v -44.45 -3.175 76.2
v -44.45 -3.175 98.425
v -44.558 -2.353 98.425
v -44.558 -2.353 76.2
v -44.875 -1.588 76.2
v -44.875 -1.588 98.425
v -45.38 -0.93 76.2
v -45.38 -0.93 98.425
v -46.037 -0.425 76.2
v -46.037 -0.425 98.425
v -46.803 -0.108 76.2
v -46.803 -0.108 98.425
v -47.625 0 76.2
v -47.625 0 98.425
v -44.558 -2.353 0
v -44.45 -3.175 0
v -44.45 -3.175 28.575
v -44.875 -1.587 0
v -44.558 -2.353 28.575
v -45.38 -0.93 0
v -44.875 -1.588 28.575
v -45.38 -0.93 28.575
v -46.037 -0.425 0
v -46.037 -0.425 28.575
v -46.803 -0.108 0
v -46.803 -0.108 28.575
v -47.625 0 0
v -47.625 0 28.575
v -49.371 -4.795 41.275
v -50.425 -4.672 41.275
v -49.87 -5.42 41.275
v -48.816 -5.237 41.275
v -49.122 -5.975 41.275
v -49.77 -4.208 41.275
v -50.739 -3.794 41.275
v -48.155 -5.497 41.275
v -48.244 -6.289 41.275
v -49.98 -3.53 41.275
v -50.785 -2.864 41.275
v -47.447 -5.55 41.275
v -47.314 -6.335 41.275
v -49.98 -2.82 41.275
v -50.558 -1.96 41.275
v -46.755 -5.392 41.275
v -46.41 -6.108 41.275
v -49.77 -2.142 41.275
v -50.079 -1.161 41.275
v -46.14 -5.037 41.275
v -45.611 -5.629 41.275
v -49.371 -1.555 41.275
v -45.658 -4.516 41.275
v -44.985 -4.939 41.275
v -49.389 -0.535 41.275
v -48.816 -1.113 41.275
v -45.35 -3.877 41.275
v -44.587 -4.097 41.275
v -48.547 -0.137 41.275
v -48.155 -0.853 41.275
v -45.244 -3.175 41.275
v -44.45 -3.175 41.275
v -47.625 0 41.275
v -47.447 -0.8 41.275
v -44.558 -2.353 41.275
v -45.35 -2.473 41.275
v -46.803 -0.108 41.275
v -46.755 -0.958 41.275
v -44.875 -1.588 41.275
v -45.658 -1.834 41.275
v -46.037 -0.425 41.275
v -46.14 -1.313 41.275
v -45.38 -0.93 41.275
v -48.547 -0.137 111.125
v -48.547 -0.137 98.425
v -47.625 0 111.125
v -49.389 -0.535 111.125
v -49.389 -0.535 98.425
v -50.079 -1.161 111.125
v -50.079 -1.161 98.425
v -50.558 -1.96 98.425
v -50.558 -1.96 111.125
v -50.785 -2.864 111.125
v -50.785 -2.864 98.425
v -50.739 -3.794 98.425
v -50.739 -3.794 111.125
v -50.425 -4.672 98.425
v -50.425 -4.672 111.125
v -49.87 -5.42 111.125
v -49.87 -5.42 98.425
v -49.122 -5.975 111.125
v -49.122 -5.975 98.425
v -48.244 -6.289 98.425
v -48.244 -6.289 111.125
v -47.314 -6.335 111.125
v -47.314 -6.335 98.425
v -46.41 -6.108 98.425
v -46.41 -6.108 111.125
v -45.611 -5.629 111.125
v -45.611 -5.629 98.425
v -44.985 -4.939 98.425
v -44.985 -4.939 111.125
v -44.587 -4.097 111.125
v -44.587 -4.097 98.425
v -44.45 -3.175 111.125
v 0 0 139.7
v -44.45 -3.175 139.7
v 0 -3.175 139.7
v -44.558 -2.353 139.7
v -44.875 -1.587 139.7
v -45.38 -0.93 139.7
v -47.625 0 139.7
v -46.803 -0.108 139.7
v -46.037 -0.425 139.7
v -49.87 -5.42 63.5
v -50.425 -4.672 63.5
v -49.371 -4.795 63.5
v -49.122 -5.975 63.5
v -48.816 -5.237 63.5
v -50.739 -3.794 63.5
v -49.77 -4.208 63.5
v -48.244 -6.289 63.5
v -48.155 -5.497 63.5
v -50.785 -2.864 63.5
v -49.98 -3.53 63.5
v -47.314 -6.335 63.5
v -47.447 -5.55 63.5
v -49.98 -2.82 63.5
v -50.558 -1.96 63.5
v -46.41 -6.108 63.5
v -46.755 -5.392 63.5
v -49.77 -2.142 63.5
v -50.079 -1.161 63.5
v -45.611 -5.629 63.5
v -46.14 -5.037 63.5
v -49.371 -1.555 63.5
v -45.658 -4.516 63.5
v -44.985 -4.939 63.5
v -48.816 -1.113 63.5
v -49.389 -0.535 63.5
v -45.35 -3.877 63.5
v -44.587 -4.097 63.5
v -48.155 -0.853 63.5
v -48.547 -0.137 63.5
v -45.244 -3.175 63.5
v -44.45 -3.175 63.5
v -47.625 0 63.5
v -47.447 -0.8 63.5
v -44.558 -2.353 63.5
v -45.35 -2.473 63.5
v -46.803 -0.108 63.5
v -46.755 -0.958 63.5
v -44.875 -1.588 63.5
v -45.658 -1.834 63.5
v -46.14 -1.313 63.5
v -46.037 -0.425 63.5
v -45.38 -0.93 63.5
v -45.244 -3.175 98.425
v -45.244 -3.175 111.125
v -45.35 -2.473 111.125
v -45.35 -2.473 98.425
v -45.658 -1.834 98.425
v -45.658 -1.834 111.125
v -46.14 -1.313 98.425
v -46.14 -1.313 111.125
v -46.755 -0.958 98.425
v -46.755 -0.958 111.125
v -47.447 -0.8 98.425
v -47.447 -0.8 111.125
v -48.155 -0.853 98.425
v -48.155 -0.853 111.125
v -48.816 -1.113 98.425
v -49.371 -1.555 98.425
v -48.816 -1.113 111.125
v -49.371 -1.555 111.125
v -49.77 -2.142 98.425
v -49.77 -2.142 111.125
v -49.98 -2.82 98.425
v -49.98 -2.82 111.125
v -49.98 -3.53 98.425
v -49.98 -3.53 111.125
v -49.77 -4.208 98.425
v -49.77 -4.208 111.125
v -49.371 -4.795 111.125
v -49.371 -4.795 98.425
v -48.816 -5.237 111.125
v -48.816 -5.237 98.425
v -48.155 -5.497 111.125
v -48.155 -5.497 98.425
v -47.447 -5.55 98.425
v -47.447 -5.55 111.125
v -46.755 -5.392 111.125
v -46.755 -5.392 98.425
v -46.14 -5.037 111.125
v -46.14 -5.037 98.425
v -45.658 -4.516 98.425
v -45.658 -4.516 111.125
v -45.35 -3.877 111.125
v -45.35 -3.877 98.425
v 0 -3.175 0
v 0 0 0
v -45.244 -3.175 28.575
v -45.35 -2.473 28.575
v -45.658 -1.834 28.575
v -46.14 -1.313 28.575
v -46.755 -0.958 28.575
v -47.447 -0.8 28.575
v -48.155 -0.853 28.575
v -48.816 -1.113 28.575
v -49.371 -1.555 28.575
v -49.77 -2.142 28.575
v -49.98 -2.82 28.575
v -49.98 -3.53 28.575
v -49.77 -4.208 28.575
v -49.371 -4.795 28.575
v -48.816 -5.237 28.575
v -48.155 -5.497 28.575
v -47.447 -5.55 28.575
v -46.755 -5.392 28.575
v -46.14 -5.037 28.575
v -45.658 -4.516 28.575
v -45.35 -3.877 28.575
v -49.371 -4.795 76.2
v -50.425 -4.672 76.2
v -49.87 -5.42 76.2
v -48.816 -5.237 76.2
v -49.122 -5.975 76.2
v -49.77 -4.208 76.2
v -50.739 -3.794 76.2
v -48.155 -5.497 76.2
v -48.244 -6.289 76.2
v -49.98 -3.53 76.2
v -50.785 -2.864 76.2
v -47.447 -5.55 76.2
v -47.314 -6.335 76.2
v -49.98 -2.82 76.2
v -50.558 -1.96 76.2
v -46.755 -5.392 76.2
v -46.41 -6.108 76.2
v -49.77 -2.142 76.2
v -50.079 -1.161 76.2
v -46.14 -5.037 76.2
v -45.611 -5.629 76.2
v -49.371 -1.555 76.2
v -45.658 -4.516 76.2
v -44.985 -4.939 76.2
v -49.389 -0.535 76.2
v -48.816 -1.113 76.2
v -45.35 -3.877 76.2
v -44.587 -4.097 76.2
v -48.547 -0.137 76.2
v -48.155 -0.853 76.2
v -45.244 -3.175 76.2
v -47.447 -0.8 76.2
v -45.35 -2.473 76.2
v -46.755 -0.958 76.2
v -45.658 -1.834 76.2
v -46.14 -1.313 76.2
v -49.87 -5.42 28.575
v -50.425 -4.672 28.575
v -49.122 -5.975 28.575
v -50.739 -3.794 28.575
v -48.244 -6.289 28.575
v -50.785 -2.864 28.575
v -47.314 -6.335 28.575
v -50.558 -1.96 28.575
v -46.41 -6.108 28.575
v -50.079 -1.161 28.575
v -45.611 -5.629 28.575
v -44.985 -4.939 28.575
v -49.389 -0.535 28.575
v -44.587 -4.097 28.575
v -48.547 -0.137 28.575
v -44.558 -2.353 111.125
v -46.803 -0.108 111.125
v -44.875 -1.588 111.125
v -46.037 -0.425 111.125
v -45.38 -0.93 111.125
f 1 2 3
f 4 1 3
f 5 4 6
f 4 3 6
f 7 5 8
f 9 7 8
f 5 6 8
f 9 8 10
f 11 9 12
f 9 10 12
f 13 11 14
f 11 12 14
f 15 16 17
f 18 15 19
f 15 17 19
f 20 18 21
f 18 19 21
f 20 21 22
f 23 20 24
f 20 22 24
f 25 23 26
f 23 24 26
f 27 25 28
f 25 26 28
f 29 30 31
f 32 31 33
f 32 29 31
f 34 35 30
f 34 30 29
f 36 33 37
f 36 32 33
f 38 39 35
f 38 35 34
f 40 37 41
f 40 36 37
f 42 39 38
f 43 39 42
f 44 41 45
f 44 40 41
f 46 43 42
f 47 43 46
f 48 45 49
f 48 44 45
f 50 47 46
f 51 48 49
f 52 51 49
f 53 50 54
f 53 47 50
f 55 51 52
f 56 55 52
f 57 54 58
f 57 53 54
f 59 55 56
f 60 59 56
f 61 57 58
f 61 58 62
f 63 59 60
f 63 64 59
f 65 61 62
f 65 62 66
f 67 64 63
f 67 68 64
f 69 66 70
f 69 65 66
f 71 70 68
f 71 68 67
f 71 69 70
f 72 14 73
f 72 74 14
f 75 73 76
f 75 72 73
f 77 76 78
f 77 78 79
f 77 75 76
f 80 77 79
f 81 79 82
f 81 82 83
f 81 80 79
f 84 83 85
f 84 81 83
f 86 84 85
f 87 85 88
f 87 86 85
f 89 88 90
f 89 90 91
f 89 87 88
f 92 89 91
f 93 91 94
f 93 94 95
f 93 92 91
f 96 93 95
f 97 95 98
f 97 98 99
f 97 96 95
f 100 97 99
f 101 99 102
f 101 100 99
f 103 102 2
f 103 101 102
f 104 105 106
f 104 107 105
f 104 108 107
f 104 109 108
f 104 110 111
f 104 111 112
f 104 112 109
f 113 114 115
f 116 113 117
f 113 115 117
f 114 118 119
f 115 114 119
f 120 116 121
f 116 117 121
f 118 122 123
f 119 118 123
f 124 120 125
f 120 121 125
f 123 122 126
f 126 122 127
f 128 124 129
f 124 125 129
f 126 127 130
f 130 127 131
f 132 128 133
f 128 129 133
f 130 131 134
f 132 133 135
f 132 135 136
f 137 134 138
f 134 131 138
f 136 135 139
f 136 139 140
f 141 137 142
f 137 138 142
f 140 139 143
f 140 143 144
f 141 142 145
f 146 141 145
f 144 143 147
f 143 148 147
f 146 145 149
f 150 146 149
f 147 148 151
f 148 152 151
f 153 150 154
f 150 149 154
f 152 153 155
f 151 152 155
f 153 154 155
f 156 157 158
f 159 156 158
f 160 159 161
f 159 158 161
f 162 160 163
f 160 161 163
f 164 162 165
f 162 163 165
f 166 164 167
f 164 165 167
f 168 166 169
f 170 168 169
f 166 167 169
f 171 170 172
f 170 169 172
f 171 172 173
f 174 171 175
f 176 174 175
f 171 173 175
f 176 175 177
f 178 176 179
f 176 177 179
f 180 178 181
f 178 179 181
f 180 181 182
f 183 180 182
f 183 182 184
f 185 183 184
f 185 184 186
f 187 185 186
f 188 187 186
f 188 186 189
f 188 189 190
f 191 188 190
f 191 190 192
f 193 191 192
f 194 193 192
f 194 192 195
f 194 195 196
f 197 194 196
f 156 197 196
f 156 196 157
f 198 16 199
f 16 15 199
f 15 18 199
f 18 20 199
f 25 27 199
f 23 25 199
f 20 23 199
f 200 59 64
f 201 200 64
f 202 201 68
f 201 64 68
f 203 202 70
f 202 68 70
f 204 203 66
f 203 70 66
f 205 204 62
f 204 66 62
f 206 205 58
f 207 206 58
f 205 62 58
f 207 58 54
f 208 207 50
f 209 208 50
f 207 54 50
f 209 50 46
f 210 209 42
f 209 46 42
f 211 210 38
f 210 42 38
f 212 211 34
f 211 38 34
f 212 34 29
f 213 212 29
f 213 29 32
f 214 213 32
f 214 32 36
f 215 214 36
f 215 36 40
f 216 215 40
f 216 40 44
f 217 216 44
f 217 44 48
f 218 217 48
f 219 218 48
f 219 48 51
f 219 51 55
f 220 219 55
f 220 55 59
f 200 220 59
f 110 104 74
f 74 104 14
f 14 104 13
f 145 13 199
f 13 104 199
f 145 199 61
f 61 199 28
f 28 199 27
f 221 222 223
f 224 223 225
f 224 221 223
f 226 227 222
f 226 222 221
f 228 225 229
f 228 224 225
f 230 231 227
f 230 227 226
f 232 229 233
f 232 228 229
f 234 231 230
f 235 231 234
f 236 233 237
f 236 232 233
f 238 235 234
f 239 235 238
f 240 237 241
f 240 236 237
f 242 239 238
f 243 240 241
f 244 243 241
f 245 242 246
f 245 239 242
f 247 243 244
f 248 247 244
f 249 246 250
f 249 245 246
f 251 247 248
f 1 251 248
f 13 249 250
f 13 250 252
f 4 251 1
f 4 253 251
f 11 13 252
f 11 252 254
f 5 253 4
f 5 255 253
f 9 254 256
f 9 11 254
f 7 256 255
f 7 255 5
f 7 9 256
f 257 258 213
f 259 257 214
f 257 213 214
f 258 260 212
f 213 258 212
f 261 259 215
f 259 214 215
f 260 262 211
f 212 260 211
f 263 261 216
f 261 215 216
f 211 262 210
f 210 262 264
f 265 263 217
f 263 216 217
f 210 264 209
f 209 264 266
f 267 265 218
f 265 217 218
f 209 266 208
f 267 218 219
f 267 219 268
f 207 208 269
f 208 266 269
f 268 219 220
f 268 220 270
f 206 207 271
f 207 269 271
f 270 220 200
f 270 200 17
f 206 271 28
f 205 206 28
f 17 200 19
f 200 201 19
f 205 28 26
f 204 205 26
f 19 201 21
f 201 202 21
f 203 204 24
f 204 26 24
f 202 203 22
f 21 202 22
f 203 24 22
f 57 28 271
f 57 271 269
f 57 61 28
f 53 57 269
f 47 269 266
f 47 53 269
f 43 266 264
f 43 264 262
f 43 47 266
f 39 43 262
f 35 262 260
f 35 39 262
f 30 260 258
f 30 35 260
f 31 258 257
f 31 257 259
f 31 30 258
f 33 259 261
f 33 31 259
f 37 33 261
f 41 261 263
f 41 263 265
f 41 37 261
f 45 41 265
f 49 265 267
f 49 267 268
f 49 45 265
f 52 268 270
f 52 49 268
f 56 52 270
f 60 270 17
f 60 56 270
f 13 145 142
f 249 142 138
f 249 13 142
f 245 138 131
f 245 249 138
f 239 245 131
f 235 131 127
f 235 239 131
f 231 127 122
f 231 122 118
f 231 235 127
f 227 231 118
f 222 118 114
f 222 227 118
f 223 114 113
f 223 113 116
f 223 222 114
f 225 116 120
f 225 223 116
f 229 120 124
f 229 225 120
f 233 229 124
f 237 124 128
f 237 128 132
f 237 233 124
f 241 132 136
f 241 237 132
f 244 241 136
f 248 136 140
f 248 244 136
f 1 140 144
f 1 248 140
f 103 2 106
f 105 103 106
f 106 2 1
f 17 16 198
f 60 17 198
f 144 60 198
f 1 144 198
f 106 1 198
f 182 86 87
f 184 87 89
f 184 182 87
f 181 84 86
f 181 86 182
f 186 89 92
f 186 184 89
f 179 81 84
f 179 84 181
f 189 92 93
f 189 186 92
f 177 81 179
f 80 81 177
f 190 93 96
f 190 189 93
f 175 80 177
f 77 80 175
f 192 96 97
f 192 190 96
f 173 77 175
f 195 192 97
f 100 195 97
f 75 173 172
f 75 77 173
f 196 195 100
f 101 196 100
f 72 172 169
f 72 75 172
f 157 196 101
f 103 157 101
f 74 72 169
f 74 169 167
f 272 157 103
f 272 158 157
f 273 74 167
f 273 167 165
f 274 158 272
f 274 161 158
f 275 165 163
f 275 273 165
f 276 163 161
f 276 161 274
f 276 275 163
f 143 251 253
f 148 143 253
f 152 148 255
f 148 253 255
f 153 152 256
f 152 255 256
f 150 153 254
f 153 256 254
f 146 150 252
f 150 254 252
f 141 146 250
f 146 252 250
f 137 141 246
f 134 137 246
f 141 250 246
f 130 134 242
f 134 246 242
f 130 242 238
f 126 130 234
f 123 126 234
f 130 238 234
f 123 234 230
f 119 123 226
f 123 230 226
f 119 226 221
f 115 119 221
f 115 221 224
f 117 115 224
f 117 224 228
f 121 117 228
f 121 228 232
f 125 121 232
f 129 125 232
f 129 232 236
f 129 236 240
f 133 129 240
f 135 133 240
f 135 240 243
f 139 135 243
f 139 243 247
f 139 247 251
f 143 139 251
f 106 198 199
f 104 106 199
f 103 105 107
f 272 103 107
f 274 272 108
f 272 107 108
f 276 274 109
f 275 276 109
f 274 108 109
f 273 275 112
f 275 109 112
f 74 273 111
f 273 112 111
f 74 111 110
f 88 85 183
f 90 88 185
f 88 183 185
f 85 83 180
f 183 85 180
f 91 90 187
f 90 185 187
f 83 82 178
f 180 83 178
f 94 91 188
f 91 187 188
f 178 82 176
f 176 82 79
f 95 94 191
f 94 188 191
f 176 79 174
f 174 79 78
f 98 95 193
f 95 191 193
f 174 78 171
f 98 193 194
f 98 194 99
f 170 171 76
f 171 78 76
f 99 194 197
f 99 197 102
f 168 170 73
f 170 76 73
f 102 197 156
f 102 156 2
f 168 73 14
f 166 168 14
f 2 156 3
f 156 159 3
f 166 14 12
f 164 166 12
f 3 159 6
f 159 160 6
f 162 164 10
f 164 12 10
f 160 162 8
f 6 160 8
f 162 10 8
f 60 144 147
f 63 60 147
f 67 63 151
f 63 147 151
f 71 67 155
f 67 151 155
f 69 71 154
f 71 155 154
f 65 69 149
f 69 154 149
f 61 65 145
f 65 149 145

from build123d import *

# Parameters (mm, degrees)
F1_DEPTH  = 139.7
F3_DEPTH  = 139.701
F7_R      = 3.175
F8_DEPTH  = 6.35
F9_R      = 3.175
F10_DEPTH = 6.35
F11_R     = 3.175
F12_DEPTH = 6.35
F13_R     = 2.38125
F14_DEPTH = 139.701


with BuildPart() as f1:
    # F0 (on Top) → F1 (new body)
    with BuildSketch(Plane.XY):
        with BuildLine():
            Line((0, -3.175), (0, 0))
            Line((0, 0), (-47.625, 0))
            ThreePointArc((-47.625, 0), (-49.8700640303, -5.4200640303), (-44.45, -3.175))
            Line((-44.45, -3.175), (0, -3.175))
        make_face()
    extrude(amount=F1_DEPTH)

    # F2 (on face) → F3 (cut, through all)
    with BuildSketch(Plane.XY.offset(139.7)):
        with BuildLine():
            ThreePointArc((-47.625, 0), (-49.8700640303, -5.4200640303), (-44.45, -3.175))
            ThreePointArc((-44.45, -3.175), (-45.3799359697, -0.9299359697), (-47.625, 0))
        make_face()
    extrude(amount=-F3_DEPTH, mode=Mode.SUBTRACT)

    # F7 (on mid) → F8 (join, symmetric)
    with BuildSketch(Plane.XY.offset(104.775)):
        with Locations((-47.625, -3.175)):
            Circle(F7_R)
    extrude(amount=F8_DEPTH, both=True)

    # F9 (on mid) → F10 (join, symmetric)
    with BuildSketch(Plane.XY.offset(69.85)):
        with Locations((-47.625, -3.175)):
            Circle(F9_R)
    extrude(amount=F10_DEPTH, both=True)

    # F11 (on mid) → F12 (join, symmetric)
    with BuildSketch(Plane.XY.offset(34.925)):
        with Locations((-47.625, -3.175)):
            Circle(F11_R)
    extrude(amount=F12_DEPTH, both=True)

    # F13 (on face) → F14 (cut, through all)
    with BuildSketch(Plane.XY.offset(139.7)):
        with Locations((-47.625, -3.175)):
            Circle(F13_R)
    extrude(amount=-F14_DEPTH, mode=Mode.SUBTRACT)


solid = f1.part
